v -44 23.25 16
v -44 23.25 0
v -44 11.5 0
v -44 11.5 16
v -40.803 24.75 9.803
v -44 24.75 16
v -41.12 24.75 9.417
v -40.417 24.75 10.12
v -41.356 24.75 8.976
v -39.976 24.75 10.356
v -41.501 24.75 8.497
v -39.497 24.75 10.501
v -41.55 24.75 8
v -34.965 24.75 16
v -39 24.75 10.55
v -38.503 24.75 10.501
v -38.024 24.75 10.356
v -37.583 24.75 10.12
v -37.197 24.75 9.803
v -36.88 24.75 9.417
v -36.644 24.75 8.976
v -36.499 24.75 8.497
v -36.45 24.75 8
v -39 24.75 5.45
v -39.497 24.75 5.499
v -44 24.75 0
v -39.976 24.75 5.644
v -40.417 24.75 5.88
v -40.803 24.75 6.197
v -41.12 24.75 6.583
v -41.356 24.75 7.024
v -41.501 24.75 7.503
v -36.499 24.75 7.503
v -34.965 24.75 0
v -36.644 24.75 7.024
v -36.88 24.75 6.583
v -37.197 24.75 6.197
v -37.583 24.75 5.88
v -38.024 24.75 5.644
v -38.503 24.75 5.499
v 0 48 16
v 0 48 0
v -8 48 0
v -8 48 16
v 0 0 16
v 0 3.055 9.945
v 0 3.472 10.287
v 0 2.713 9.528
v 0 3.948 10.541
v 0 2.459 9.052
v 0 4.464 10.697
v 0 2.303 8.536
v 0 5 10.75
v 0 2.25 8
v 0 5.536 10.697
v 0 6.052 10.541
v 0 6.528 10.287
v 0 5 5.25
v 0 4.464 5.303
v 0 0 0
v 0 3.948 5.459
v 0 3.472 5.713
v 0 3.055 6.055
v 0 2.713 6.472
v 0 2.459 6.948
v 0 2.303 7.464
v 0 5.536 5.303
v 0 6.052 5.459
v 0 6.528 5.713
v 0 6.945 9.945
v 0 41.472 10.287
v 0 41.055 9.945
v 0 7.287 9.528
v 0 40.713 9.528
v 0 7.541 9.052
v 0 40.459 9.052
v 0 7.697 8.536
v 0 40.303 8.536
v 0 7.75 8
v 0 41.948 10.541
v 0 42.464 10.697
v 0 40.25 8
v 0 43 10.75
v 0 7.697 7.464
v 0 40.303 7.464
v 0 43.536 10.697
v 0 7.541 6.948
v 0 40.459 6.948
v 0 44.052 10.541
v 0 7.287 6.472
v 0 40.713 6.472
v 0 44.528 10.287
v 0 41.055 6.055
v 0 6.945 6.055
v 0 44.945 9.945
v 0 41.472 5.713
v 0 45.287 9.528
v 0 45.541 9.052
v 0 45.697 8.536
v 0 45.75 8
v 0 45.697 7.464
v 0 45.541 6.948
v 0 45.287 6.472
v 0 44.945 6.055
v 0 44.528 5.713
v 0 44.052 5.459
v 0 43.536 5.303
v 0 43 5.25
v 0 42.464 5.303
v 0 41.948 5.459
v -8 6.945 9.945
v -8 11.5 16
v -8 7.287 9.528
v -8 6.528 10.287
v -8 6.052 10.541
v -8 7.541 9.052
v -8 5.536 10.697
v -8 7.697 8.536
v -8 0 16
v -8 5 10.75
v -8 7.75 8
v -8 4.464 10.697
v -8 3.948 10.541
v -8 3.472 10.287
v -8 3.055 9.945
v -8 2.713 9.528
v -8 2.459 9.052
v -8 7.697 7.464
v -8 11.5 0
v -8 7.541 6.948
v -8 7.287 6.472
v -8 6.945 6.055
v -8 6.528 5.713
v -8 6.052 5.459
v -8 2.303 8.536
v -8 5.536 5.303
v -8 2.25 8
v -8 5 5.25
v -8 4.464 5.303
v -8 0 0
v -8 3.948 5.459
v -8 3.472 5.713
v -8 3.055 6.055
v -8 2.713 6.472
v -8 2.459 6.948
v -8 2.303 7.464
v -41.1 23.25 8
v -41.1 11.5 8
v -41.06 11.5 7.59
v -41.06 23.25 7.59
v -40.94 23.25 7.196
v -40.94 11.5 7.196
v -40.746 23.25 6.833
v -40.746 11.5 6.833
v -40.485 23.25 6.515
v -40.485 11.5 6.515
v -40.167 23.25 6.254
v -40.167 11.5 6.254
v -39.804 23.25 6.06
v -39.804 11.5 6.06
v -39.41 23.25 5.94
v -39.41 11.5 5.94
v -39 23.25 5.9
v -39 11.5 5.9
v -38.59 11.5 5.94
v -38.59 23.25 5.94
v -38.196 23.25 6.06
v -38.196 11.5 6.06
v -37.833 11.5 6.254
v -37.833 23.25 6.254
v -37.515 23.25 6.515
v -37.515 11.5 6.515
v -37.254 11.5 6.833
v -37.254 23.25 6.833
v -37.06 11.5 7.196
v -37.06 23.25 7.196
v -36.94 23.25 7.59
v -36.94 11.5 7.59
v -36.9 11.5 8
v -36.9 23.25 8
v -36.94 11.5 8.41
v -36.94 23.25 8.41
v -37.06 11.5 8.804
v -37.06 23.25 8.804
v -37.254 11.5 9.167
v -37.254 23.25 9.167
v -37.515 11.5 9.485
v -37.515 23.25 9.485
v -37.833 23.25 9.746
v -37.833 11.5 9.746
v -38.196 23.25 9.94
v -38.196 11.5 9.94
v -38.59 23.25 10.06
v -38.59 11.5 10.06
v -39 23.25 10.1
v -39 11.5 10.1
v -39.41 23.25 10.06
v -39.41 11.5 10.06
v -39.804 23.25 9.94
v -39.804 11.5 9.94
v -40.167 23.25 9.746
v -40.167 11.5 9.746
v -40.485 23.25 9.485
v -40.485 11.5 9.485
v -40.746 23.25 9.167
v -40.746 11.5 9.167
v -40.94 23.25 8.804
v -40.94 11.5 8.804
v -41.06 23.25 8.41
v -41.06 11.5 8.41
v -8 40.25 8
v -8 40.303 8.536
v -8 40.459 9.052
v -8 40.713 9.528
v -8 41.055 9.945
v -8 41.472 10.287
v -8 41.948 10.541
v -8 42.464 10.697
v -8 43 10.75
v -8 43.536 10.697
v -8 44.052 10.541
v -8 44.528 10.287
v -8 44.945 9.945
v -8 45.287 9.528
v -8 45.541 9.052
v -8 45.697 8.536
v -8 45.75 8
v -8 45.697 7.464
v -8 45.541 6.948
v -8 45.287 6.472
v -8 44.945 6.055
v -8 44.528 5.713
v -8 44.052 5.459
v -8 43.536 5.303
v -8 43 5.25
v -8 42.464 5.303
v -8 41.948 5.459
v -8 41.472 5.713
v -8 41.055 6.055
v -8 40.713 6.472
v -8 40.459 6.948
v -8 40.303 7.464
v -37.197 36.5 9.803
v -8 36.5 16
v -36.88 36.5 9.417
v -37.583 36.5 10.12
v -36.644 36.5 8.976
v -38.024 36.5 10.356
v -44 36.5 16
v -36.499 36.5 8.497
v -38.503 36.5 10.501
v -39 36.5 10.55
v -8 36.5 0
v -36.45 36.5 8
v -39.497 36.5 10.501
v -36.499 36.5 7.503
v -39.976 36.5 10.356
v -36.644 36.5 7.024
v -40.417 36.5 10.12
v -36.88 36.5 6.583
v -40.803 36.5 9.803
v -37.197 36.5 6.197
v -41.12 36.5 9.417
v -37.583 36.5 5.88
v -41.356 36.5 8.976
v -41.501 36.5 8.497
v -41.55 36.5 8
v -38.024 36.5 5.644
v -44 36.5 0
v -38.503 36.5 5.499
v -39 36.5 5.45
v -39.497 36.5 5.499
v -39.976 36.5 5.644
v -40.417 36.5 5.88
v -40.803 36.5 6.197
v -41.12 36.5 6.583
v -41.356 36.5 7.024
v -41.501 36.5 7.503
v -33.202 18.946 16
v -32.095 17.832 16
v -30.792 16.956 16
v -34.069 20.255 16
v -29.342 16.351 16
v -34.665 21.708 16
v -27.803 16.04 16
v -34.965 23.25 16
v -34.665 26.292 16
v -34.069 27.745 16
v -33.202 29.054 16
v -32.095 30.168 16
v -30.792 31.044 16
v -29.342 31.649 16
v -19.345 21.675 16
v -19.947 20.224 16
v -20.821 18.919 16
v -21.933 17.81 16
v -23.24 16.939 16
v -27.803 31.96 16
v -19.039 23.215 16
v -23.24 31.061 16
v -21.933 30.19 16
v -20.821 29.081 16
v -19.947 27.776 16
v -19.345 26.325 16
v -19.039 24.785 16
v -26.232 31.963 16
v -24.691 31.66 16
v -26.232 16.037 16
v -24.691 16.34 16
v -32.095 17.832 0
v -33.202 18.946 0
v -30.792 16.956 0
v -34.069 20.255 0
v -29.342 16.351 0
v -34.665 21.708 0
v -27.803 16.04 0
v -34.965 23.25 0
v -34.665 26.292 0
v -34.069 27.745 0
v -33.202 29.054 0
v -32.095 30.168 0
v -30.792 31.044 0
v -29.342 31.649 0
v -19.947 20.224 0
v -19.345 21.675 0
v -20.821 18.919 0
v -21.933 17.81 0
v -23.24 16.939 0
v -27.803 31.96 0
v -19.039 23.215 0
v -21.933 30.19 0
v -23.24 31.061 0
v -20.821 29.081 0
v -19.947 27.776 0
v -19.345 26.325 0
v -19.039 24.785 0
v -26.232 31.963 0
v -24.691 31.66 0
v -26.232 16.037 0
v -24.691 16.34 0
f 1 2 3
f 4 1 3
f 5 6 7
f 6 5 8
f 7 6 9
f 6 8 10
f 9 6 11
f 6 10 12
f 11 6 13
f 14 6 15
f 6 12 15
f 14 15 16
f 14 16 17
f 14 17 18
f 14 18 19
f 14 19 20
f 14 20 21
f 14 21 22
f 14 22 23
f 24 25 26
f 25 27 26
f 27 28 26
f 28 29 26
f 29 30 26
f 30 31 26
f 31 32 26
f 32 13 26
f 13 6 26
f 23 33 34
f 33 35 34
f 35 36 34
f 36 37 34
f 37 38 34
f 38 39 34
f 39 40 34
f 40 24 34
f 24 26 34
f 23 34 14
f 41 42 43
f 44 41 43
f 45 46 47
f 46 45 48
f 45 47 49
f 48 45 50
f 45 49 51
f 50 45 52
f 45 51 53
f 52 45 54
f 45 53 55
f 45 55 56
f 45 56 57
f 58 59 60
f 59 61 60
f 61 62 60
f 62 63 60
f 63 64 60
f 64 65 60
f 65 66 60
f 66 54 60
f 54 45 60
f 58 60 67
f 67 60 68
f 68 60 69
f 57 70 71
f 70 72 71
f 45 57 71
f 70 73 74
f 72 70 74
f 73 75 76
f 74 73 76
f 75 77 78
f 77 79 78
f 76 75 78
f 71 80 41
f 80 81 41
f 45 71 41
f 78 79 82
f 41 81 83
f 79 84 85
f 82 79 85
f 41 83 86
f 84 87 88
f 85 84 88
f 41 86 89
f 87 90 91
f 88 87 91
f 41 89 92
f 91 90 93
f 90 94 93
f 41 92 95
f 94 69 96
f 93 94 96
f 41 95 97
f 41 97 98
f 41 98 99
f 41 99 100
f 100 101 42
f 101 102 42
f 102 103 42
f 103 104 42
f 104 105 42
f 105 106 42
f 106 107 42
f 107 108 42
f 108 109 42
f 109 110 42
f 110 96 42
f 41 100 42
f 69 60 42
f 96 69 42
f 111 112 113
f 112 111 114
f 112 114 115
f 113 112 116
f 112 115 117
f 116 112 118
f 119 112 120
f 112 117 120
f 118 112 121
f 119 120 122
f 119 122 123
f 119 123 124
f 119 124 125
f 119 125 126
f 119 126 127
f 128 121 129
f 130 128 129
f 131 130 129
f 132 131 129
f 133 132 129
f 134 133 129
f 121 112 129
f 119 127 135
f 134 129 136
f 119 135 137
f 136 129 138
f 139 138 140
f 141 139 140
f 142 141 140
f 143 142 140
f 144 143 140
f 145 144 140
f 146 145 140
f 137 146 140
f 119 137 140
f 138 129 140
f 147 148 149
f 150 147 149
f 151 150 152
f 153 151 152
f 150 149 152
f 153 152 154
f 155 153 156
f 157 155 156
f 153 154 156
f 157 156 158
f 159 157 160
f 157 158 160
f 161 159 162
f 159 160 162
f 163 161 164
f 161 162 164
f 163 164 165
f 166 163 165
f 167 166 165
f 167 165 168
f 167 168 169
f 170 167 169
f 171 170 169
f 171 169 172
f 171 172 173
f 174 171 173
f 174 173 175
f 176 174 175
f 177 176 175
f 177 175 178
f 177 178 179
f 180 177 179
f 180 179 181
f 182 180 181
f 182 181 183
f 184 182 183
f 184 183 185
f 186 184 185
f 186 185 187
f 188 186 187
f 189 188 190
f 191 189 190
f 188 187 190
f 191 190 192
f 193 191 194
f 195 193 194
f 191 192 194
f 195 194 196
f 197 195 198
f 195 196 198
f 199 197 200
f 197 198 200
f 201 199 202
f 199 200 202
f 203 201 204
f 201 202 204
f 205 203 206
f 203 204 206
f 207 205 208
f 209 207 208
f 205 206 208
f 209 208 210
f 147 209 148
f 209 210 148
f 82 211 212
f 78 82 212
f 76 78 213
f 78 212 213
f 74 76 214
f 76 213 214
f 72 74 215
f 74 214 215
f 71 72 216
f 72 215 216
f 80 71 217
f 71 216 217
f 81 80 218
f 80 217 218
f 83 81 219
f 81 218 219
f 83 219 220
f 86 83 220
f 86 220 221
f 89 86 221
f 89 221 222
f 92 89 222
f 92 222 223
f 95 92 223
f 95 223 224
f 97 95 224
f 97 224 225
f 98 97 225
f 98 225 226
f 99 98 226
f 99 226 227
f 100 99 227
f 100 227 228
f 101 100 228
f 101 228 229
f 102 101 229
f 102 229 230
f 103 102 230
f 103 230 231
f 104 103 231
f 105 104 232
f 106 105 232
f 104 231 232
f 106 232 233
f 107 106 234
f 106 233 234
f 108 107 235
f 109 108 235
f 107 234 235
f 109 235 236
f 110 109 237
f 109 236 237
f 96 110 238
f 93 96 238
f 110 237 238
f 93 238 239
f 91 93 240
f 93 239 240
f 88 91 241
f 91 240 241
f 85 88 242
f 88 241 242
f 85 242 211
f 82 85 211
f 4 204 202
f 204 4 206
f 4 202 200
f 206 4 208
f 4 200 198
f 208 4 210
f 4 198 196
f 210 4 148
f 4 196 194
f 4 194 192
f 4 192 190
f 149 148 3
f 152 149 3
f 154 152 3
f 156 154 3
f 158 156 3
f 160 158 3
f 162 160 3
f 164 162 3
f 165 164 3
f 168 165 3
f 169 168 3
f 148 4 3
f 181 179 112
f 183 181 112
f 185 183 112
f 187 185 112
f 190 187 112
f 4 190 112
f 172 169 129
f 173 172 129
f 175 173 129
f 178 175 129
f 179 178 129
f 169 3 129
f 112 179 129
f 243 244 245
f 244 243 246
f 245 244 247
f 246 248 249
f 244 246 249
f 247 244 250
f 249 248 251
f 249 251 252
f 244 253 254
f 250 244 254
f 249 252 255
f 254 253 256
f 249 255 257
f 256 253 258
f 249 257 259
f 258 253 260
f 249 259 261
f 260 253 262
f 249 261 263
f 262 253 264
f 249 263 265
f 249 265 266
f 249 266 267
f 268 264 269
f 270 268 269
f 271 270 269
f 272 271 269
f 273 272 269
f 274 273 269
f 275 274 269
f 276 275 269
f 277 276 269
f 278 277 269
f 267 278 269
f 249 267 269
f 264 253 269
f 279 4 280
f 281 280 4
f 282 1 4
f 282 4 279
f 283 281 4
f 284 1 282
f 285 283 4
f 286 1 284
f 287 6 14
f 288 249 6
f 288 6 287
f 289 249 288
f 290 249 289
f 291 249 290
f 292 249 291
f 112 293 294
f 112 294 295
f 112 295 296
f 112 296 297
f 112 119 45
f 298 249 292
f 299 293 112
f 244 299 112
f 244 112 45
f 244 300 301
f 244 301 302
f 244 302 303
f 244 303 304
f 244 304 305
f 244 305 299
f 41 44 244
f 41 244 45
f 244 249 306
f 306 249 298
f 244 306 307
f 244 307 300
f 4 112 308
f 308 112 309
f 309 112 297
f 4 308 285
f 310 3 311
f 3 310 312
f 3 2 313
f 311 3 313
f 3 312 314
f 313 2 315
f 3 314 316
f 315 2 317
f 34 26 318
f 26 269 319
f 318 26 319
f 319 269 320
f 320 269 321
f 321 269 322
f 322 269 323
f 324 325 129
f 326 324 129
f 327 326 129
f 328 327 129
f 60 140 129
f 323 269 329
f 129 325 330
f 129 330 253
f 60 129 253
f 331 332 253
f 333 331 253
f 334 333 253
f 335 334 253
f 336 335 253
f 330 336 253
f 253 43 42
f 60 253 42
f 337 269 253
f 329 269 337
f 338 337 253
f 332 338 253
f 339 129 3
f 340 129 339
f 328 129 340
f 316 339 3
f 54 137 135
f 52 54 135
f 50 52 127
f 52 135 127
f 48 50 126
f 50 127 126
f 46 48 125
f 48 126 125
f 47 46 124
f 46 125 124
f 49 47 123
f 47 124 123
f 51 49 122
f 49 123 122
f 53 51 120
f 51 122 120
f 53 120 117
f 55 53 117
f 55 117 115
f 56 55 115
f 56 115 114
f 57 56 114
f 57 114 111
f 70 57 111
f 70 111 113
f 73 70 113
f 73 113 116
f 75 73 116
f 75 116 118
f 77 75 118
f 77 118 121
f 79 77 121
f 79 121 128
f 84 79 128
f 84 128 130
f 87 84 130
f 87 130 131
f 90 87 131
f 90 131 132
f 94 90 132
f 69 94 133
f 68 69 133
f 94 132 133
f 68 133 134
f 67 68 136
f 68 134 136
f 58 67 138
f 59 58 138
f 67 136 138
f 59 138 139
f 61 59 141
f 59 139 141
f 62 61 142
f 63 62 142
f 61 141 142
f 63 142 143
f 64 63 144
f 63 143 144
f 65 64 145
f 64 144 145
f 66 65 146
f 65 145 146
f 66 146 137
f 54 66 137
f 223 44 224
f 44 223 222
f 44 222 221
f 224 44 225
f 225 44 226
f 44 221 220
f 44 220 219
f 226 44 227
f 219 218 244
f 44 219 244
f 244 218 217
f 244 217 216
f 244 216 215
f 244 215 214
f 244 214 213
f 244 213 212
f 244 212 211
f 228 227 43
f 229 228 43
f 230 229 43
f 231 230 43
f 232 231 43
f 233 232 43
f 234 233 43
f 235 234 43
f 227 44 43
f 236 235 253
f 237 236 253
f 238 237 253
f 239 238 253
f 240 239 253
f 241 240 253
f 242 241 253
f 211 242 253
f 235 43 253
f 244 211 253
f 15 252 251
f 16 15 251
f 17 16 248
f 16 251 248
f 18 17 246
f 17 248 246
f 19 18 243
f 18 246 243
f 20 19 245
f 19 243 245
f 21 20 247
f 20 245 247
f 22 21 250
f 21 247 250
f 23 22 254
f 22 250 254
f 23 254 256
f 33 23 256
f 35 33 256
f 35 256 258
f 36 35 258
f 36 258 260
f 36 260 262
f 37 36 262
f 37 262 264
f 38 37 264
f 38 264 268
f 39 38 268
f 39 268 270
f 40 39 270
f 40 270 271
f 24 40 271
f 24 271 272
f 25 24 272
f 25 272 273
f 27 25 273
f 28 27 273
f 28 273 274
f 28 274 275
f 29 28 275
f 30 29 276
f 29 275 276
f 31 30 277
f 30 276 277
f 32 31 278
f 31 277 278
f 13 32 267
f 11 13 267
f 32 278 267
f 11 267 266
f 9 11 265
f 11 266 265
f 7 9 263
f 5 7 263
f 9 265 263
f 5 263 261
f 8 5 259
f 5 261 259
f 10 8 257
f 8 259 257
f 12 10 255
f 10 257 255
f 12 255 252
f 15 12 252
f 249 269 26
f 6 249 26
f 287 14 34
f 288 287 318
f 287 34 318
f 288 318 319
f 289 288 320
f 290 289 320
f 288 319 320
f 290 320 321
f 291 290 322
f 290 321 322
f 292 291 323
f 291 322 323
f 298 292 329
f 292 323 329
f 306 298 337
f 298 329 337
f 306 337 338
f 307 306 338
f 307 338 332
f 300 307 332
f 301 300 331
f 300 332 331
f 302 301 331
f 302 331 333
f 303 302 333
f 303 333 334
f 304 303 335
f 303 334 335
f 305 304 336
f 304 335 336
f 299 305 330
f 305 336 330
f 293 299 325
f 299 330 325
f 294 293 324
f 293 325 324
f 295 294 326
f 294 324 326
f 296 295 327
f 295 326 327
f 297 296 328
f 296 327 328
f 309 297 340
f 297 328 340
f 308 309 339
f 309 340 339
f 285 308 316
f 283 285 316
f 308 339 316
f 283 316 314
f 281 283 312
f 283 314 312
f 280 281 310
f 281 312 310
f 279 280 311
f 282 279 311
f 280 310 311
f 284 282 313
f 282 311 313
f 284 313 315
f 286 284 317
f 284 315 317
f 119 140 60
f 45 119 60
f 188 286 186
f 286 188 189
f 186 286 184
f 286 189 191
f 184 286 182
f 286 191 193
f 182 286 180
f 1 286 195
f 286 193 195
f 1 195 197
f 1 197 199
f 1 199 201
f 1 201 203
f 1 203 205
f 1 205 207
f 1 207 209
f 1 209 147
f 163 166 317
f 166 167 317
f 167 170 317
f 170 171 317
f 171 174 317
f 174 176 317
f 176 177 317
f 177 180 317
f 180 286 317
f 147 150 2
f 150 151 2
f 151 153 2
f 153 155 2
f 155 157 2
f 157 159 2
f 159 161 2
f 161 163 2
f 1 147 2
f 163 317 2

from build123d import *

# Parameters (mm, degrees)
EXTRUS_O1_DEPTH               = 16
EXTRUS_O2_REACH               = 61.365
ESBO_O2_R                     = 2.55
FURO_ROSCADO_DE_M5X0_82_D     = 4.2
FURO_ROSCADO_DE_M5X0_82_DEPTH = 14
FURO_ROSCADO_DE_M5X0_82_TIP   = 1.2618073
ESBO_O5_R                     = 2.75
EXTRUS_O3_DEPTH               = 63.096698785


with BuildPart() as part:
    # Esboço1 → Extrusão1 (new body)
    with BuildSketch(Plane.XY):
        with BuildLine():
            Line((0, 0), (0, 48))
            Line((0, 48), (-8, 48))
            Line((-8, 48), (-8, 36.5))
            Line((-8, 36.5), (-44, 36.5))
            Line((-44, 36.5), (-44, 24.75))
            Line((-44, 24.75), (-34.964766161, 24.75))
            ThreePointArc((-34.964766161, 24.75), (-19, 24), (-34.964766161, 23.25))
            Line((-34.964766161, 23.25), (-44, 23.25))
            Line((-44, 23.25), (-44, 11.5))
            Line((-44, 11.5), (-8, 11.5))
            Line((-8, 11.5), (-8, 0))
            Line((-8, 0), (0, 0))
        make_face()
    extrude(amount=EXTRUS_O1_DEPTH)

    # Esboço2 → Extrusão2 (cut, up to next)
    with BuildSketch(Plane(origin=(0, 36.5, 0), x_dir=(1, 0, 0), z_dir=(0, 1, 0)), mode=Mode.PRIVATE) as extrus_o2_sk1:
        with Locations(Location((-39, -8, 0), (0, 0, 270))):
            Circle(ESBO_O2_R)
    extrus_o2_tool1 = extrude(extrus_o2_sk1.sketch, amount=-EXTRUS_O2_REACH, mode=Mode.PRIVATE) & part.part
    add(extrus_o2_tool1.solids().sort_by_distance((-39, 36.5, 8))[0], mode=Mode.SUBTRACT)

    # Furo roscado de M5x0.82
    with Locations(Plane(origin=(-39, 23.25, 8), x_dir=(1, 0, 0), z_dir=(0, 1, 0))):
        with Locations((0, 0)):
            Hole(FURO_ROSCADO_DE_M5X0_82_D / 2, depth=FURO_ROSCADO_DE_M5X0_82_DEPTH)
            with Locations((0, 0, -(FURO_ROSCADO_DE_M5X0_82_DEPTH + FURO_ROSCADO_DE_M5X0_82_TIP / 2))):  # 118° drill point
                Cone(0, FURO_ROSCADO_DE_M5X0_82_D / 2, FURO_ROSCADO_DE_M5X0_82_TIP, mode=Mode.SUBTRACT)

    # Esboço5 → Extrusão3 (cut, through all)
    with BuildSketch(Plane.ZY.offset(8)):
        with Locations(Location((8, 43, 0), (0, 0, 270))):
            Circle(ESBO_O5_R)
        with Locations(Location((8, 5, 0), (0, 0, 270))):
            Circle(ESBO_O5_R)
    extrude(amount=-EXTRUS_O3_DEPTH, mode=Mode.SUBTRACT)


solid = part.part
